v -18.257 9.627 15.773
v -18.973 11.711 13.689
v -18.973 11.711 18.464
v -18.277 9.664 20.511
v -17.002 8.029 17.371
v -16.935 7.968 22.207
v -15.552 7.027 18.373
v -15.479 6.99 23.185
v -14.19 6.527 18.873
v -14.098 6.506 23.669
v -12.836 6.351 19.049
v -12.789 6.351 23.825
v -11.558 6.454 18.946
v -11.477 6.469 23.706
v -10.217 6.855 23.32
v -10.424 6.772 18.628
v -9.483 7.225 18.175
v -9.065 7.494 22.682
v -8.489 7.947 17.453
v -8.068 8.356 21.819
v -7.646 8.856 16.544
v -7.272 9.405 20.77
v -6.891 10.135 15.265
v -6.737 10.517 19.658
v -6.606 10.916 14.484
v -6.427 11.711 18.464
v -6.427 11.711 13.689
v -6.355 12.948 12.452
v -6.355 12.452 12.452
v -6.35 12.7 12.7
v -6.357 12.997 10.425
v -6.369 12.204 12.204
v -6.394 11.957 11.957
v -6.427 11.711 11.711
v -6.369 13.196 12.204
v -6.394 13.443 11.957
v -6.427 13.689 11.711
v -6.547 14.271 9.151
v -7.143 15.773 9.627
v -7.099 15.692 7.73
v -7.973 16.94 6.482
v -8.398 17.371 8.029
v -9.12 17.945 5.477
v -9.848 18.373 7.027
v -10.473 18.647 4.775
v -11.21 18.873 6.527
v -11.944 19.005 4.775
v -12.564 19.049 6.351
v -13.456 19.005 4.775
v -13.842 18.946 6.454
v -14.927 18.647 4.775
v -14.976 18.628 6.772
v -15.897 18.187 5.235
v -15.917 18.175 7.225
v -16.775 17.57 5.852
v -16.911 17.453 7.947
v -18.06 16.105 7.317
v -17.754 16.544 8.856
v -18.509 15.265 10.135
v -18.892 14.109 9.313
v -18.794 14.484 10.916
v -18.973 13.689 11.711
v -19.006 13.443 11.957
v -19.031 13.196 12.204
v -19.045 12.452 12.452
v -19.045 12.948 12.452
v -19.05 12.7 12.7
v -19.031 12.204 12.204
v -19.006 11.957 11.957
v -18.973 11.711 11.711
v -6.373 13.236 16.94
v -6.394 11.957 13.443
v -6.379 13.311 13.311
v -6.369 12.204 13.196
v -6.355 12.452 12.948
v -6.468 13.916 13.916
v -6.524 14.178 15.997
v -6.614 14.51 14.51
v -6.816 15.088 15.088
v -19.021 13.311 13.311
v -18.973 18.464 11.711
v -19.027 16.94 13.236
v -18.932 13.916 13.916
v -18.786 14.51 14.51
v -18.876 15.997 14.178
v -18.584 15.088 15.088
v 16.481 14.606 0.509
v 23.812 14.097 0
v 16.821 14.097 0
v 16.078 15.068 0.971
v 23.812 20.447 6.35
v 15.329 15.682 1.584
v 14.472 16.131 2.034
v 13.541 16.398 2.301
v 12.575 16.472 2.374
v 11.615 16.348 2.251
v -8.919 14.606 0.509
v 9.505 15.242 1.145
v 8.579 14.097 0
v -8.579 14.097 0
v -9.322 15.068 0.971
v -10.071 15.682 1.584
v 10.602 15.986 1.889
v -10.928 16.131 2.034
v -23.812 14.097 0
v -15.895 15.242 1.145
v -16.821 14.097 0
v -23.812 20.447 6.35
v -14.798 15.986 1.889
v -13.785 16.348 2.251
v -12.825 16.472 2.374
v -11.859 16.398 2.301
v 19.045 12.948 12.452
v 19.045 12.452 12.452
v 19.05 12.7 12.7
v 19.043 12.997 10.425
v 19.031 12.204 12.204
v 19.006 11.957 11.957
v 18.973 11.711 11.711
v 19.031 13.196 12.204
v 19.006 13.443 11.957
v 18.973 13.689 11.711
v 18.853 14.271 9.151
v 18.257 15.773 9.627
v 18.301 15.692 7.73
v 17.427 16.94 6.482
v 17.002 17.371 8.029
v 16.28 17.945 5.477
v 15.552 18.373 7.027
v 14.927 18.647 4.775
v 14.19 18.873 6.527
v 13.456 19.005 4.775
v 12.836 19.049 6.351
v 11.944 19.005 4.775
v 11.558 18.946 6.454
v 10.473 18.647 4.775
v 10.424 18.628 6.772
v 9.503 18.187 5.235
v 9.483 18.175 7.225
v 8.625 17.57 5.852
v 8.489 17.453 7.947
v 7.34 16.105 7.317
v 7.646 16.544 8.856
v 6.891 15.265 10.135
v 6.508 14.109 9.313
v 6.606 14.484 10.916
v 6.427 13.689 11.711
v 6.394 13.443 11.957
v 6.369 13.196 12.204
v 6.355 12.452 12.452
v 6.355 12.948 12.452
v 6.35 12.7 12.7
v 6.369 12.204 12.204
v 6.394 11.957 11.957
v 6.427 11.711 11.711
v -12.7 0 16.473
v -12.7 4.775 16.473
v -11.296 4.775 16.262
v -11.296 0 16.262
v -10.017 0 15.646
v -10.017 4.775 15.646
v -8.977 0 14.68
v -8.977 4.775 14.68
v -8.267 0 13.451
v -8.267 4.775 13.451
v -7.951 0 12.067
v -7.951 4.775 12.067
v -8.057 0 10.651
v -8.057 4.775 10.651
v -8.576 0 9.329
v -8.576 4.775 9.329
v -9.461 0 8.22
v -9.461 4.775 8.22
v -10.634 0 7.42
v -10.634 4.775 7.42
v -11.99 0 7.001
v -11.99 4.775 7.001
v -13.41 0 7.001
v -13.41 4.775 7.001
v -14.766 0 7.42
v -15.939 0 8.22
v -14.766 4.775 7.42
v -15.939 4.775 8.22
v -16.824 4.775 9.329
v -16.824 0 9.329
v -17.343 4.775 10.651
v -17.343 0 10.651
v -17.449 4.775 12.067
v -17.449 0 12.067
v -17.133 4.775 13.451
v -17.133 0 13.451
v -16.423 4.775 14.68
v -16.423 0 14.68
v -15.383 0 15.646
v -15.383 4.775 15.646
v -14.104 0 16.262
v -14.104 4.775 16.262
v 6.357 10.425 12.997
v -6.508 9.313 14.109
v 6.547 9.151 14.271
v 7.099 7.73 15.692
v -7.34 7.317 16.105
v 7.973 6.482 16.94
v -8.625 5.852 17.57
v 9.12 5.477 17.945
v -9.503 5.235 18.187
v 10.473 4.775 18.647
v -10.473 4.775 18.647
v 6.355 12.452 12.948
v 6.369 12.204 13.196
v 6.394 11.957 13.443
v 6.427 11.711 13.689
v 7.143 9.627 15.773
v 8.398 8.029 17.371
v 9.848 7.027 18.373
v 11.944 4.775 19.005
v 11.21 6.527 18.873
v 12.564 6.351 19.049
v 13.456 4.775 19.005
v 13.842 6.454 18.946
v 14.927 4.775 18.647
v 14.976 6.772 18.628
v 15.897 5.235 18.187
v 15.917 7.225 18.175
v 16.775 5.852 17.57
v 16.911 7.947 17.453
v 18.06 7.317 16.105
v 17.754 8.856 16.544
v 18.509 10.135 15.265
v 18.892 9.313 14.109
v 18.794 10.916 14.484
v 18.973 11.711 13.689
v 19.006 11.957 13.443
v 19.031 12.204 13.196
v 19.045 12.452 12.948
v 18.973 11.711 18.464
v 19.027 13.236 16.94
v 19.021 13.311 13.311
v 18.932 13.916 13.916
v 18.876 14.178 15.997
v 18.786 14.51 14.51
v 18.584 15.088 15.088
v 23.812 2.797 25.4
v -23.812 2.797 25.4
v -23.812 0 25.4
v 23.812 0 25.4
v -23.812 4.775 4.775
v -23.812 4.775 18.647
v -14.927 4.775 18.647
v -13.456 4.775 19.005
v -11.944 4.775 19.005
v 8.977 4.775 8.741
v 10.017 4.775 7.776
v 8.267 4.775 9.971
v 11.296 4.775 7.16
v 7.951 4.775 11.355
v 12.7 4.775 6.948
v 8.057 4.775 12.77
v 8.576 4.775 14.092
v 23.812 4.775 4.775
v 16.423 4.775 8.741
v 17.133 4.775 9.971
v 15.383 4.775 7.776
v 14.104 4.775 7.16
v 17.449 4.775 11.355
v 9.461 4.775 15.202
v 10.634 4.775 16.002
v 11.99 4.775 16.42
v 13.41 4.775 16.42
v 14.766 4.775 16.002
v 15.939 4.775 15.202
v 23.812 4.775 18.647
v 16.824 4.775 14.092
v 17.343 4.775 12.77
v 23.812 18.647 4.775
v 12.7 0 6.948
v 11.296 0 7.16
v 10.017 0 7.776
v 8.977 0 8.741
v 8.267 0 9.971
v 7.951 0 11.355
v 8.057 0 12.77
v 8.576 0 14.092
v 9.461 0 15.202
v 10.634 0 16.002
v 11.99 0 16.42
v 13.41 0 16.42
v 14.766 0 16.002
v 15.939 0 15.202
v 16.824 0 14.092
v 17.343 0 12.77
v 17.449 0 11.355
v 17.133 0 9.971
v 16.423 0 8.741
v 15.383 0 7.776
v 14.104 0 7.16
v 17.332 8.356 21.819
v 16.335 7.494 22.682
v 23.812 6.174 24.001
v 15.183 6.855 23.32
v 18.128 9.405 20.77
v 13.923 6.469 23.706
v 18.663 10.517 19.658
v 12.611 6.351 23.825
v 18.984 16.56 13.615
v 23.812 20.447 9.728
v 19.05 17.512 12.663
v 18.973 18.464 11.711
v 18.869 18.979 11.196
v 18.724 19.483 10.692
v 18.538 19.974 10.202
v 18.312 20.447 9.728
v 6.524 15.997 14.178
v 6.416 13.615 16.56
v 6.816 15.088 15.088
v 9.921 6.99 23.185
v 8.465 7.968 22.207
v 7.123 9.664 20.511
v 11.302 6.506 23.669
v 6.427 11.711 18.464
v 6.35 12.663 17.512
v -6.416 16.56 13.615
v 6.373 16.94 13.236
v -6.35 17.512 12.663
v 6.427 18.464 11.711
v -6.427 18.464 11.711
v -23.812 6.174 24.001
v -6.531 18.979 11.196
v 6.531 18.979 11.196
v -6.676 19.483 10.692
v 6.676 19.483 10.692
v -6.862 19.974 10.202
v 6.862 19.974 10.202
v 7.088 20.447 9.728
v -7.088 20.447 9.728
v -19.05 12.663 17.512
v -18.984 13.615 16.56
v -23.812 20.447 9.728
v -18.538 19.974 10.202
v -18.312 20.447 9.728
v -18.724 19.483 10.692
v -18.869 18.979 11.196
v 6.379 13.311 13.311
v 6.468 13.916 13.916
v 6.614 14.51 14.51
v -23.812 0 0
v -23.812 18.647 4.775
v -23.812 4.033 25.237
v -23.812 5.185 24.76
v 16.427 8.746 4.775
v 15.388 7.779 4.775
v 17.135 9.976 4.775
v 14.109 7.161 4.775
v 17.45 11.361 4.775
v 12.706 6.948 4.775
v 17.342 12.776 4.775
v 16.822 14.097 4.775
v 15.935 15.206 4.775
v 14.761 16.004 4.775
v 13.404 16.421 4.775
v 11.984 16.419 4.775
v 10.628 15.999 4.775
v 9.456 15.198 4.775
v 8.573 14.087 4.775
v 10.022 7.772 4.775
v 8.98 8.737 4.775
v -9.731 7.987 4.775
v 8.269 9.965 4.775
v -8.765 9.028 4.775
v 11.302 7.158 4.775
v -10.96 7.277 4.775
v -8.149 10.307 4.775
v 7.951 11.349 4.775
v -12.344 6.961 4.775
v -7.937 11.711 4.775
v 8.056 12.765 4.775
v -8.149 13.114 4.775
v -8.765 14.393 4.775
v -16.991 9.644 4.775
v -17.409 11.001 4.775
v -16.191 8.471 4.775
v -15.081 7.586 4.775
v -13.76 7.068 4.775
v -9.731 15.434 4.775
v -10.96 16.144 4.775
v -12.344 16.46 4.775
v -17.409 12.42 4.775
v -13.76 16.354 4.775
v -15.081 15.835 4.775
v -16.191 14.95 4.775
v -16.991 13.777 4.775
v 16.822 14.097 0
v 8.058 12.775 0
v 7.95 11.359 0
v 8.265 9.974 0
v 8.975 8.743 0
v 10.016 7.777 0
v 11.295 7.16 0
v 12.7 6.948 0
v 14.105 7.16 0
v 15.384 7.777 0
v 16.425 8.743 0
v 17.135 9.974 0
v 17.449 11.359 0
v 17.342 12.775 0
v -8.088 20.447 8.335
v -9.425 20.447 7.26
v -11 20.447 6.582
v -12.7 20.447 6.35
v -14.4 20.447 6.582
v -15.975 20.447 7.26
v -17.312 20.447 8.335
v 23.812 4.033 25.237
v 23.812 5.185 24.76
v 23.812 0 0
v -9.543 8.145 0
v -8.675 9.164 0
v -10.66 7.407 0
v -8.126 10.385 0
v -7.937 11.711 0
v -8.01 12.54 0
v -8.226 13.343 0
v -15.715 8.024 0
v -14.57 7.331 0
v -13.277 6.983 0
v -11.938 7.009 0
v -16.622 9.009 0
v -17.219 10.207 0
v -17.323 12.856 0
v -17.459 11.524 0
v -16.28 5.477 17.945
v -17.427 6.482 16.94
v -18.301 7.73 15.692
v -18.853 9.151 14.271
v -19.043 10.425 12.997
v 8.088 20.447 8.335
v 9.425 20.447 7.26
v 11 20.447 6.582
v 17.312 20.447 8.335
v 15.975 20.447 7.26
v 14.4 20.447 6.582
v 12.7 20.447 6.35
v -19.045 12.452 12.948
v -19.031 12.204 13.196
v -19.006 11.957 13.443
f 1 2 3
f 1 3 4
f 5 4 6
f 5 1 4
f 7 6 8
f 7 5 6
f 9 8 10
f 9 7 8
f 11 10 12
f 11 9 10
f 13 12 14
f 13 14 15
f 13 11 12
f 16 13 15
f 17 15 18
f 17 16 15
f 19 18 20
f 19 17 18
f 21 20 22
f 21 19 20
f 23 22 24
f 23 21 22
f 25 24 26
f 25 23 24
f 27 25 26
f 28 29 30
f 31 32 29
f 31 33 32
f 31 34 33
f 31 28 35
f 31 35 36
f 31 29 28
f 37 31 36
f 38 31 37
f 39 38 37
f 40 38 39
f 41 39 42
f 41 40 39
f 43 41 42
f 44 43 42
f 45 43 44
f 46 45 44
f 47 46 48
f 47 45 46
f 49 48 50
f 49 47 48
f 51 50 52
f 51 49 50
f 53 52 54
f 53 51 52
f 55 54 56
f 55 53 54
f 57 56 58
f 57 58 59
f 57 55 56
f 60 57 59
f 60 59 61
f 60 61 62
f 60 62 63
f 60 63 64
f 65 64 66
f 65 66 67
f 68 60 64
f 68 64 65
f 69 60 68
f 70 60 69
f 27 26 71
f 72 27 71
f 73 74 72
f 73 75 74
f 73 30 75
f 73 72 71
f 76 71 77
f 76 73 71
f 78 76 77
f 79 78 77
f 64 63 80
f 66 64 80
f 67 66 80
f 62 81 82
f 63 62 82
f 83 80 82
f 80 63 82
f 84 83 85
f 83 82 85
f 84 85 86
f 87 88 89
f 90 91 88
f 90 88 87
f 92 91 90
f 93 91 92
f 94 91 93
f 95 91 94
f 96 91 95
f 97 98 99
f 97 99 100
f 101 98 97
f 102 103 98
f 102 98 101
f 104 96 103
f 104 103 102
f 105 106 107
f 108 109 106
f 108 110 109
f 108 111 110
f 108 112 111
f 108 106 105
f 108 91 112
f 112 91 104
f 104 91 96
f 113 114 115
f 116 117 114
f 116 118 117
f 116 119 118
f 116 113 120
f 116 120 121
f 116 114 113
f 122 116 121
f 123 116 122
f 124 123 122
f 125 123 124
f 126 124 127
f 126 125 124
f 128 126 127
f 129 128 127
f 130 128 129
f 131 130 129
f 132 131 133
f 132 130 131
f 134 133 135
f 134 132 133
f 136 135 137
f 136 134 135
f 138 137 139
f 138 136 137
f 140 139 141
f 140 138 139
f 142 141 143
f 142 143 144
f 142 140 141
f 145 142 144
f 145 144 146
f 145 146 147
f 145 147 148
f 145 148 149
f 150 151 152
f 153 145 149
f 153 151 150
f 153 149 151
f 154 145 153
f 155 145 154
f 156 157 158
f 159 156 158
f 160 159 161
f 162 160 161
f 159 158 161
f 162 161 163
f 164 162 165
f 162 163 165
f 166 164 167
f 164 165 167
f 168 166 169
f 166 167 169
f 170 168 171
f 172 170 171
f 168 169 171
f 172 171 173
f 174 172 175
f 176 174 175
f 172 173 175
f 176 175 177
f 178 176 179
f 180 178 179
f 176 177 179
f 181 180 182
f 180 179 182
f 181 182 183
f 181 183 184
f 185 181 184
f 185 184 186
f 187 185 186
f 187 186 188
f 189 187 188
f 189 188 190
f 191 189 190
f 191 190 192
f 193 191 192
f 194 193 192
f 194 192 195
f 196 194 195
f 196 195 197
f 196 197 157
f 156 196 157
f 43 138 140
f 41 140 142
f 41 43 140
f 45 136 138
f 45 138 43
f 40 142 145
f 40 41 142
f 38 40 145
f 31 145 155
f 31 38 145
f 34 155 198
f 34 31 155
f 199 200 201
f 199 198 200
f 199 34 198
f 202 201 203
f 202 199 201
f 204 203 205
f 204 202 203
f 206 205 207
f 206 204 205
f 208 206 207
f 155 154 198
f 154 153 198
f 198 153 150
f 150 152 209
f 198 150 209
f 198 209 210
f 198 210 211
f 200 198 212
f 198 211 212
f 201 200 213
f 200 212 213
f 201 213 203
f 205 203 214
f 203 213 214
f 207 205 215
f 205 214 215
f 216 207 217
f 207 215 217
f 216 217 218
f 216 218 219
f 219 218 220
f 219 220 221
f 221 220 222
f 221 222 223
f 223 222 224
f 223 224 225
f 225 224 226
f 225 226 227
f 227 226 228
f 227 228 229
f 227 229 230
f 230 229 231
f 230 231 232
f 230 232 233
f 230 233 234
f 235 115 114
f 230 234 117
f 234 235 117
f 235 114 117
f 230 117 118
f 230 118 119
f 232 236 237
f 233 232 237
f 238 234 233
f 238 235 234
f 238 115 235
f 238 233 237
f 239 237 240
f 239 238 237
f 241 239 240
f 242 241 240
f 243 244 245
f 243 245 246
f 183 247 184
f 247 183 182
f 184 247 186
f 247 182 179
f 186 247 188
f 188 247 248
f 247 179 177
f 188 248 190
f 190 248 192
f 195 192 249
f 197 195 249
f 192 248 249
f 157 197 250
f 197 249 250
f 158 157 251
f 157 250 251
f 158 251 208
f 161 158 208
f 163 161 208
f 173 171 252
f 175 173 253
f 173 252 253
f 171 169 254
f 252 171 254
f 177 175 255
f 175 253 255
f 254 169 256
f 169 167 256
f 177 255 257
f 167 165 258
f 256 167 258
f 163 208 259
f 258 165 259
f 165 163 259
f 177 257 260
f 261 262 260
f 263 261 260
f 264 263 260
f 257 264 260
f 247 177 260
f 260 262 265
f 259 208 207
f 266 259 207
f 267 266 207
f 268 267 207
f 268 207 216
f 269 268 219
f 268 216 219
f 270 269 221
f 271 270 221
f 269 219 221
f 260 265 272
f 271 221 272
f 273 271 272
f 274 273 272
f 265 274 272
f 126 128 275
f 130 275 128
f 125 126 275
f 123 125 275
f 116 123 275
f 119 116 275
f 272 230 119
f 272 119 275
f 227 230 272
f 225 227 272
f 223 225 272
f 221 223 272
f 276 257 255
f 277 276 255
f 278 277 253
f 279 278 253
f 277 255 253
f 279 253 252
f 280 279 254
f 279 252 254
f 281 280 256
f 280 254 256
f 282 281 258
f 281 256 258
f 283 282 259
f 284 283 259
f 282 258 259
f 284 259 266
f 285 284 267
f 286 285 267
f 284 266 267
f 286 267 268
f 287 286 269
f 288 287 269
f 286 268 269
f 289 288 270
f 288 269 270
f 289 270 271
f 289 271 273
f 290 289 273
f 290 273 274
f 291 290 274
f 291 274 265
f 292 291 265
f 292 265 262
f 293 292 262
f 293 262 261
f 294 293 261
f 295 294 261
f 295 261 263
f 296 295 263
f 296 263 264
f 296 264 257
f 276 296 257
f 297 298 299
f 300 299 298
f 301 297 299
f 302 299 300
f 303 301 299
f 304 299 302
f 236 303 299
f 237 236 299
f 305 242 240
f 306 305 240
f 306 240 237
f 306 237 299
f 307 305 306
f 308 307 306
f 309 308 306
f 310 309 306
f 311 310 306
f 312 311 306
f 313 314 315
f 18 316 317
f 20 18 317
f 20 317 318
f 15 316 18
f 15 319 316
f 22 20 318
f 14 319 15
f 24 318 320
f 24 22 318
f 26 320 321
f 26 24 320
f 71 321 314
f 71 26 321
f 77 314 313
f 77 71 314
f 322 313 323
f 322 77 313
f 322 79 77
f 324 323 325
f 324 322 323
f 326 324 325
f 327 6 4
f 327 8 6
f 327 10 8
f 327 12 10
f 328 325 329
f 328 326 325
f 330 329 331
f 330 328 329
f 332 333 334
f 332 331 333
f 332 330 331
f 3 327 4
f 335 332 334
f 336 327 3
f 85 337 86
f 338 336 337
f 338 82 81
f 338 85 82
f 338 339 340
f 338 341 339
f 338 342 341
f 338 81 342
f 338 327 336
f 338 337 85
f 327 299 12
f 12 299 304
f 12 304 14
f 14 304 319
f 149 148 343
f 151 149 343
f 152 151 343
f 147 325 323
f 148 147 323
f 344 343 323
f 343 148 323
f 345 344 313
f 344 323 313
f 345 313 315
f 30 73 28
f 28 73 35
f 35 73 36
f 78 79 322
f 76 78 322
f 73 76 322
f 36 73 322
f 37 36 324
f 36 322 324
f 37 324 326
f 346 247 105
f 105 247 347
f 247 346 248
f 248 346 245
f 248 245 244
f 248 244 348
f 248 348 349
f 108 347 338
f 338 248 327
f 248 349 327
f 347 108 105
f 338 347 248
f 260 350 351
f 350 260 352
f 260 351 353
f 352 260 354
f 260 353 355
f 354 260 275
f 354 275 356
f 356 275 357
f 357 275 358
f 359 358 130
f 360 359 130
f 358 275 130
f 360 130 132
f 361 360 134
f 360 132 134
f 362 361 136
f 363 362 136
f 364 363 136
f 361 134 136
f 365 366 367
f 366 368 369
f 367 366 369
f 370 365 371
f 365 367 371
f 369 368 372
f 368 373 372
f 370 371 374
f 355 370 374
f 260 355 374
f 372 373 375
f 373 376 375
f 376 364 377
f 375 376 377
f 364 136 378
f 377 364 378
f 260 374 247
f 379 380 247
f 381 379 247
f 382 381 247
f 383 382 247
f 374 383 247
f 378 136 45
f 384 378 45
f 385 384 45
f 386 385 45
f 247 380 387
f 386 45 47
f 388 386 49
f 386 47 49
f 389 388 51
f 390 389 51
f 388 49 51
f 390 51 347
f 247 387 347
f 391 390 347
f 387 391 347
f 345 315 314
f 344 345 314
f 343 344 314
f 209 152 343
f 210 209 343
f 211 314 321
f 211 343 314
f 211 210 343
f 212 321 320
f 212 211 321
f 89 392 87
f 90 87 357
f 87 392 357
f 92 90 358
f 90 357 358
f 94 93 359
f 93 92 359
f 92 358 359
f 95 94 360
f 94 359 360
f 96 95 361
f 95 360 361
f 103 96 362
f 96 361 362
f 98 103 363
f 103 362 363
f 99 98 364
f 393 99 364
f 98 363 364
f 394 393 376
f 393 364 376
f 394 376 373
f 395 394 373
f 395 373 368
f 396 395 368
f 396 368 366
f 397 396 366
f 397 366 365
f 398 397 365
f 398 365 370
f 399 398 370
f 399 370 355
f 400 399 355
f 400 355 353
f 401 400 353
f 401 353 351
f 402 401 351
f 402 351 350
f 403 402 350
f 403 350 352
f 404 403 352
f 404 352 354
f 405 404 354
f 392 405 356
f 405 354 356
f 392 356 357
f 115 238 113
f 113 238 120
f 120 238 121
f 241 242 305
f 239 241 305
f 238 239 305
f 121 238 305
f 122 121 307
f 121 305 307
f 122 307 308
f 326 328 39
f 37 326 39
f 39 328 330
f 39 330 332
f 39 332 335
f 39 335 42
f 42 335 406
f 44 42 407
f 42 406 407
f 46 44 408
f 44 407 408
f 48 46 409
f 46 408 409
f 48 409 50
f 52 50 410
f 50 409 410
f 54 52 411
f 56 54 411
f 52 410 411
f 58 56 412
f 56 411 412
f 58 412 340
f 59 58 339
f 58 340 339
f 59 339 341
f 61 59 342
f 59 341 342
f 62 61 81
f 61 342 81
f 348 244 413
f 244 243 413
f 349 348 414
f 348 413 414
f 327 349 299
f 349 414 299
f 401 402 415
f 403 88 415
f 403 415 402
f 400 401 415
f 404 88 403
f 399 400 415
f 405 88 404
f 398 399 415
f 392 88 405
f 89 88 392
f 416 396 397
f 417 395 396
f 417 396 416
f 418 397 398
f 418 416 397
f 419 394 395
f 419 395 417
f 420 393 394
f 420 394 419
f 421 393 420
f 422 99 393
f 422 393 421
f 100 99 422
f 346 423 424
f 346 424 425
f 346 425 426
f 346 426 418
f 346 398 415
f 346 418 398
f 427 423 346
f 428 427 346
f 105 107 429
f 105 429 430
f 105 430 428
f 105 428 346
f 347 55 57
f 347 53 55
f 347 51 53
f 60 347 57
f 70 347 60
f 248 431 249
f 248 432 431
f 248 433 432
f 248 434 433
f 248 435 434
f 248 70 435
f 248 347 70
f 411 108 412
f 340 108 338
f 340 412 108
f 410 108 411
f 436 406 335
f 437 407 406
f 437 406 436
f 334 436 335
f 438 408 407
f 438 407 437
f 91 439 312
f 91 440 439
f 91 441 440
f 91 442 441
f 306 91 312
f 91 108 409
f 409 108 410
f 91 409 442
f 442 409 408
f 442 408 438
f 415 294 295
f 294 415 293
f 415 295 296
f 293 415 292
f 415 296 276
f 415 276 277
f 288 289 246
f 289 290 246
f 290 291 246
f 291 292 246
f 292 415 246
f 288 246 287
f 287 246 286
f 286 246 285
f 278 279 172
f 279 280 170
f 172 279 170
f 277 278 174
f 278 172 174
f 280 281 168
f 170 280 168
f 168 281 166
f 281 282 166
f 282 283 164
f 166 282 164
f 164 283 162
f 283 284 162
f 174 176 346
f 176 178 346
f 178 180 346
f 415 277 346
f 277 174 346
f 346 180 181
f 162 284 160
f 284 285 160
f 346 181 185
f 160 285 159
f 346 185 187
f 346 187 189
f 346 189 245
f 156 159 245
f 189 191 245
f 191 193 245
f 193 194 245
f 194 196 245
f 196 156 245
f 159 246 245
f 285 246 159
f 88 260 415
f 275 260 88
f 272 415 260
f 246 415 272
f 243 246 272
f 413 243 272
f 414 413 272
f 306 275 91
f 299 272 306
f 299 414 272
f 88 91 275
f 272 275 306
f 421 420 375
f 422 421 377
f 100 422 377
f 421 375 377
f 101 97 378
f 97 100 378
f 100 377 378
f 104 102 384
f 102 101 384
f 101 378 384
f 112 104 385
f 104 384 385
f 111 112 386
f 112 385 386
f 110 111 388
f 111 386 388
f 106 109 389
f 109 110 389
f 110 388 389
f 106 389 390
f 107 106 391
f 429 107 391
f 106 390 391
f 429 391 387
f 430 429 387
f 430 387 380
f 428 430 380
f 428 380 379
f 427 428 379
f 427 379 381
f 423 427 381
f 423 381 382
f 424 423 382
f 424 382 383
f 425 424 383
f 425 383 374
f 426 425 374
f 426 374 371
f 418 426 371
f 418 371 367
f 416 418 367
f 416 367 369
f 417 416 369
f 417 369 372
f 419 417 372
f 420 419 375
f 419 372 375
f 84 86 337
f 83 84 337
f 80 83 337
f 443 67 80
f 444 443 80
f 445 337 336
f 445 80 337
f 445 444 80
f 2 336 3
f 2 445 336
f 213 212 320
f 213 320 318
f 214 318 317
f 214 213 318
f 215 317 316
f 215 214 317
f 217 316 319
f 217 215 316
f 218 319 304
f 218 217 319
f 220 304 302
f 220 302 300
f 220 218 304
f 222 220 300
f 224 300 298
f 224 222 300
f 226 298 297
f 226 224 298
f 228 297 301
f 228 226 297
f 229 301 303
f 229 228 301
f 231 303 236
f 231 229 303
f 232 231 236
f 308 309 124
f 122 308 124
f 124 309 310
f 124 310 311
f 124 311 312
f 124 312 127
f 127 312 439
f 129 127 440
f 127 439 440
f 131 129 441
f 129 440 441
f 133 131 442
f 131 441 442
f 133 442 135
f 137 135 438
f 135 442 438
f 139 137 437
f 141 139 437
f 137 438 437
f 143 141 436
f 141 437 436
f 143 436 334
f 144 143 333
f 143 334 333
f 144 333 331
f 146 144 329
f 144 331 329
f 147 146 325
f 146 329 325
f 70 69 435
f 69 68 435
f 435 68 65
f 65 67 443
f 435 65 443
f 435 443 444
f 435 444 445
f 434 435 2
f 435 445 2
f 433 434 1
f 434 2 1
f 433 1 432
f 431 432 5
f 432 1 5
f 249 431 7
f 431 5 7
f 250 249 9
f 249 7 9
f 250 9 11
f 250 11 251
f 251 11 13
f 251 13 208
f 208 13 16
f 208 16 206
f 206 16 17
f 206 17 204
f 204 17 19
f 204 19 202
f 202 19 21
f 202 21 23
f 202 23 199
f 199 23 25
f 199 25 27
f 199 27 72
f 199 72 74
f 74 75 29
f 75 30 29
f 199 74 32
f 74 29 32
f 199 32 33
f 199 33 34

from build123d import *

# Parameters (mm, degrees)
BOSS_EXTRUDE1_START     = -20.6248
BOSS_EXTRUDE1_OUTLINE_W = 47.625
BOSS_EXTRUDE1_OUTLINE_H = 20.6248
BOSS_EXTRUDE1_DEPTH     = 25.4
BOSS_EXTRUDE1_2_DEPTH   = 4.7752
BOSS_EXTRUDE1_START_2   = 4.7752
BOSS_EXTRUDE1_3_DEPTH   = 20.6248
BOSS_EXTRUDE1_START_3   = -23.8125
BOSS_EXTRUDE1_4_DEPTH   = 47.625
SKETCH2_W               = 47.625
SKETCH2_H               = 25.4
BOSS_EXTRUDE2_DEPTH     = 4.7752
FILLET1_R               = 4.7752
CUT_EXTRUDE1_DEPTH      = 60.652834174
CHAMFER2_SIZE           = 6.35
SKETCH4_R               = 4.7625
CUT_EXTRUDE2_DEPTH      = 39.181153396
SKETCH5_R               = 4.7625
CUT_EXTRUDE3_DEPTH      = 38.556588562


with BuildPart() as part:
    # Boss-Extrude1: read off the stored shape, not the designer's step
    # Boss-Extrude1 outline → Boss-Extrude1 (new body)
    with BuildSketch(Plane.XZ.offset(-4.7752).offset(BOSS_EXTRUDE1_START)):
        with Locations((0, 15.0876)):
            Rectangle(BOSS_EXTRUDE1_OUTLINE_W, BOSS_EXTRUDE1_OUTLINE_H)
        with BuildLine():
            ThreePointArc((-18.972513521, 11.711023698), (-12.7, 19.05), (-6.427486479, 11.711023698))
            ThreePointArc((-6.427486479, 11.711023698), (-12.7, 6.35), (-18.972513521, 11.711023698))
        make_face(mode=Mode.SUBTRACT)
        with BuildLine():
            ThreePointArc((6.427486479, 11.711023698), (12.7, 19.05), (18.972513521, 11.711023698))
            ThreePointArc((18.972513521, 11.711023698), (12.7, 6.35), (6.427486479, 11.711023698))
        make_face(mode=Mode.SUBTRACT)
    extrude(amount=BOSS_EXTRUDE1_DEPTH)

    # Boss-Extrude1 2 outline → Boss-Extrude1 2 (add)
    with BuildSketch(Plane.XZ.offset(-4.7752)):
        with BuildLine():
            ThreePointArc((-18.972513521, 11.711023698), (-12.7, 6.35), (-6.427486479, 11.711023698))
            ThreePointArc((-6.427486479, 11.711023698), (-12.7, 19.05), (-18.972513521, 11.711023698))
        make_face()
        with BuildLine():
            ThreePointArc((6.427486479, 11.711023698), (12.7, 6.35), (18.972513521, 11.711023698))
            ThreePointArc((18.972513521, 11.711023698), (12.7, 19.05), (6.427486479, 11.711023698))
        make_face()
    extrude(amount=BOSS_EXTRUDE1_2_DEPTH)

    # Boss-Extrude1 3 outline → Boss-Extrude1 3 (cut)
    with BuildSketch(Plane.XY.offset(BOSS_EXTRUDE1_START_2)):
        with BuildLine():
            ThreePointArc((18.972513521, 11.711023698), (12.7, 19.05), (6.427486479, 11.711023698))
            ThreePointArc((6.427486479, 11.711023698), (12.7, 6.35), (18.972513521, 11.711023698))
        make_face()
        with BuildLine():
            ThreePointArc((-6.427486479, 11.711023698), (-12.7, 19.05), (-18.972513521, 11.711023698))
            ThreePointArc((-18.972513521, 11.711023698), (-12.7, 6.35), (-6.427486479, 11.711023698))
        make_face()
    extrude(amount=BOSS_EXTRUDE1_3_DEPTH, mode=Mode.SUBTRACT)

    # Boss-Extrude1 4 outline → Boss-Extrude1 4 (cut)
    with BuildSketch(Plane.YZ.offset(BOSS_EXTRUDE1_START_3)):
        Polygon((25.4, 25.4), (4.7752, 25.4), (25.4, 4.7752), align=None)
        Polygon((4.7752, 4.7752), (18.646847397, 4.7752), (4.7752, 18.646847397), align=None)
    extrude(amount=BOSS_EXTRUDE1_4_DEPTH, mode=Mode.SUBTRACT)

    # Sketch2 → Boss-Extrude2 (add)
    with BuildSketch(Plane(origin=(0, 0, 4.7752), x_dir=(-1, 0, 0), z_dir=(0, 0, -1))):
        with Locations((0, 12.7)):
            Rectangle(SKETCH2_W, SKETCH2_H)
    extrude(amount=BOSS_EXTRUDE2_DEPTH)

    # Fillet1
    fillet1_edges = [part.edges().sort_by_distance(p)[0] for p in [
        (0, 25.4, 4.7752),
        (0, 4.7752, 25.4),
    ]]
    fillet(fillet1_edges, radius=FILLET1_R)

    # Sketch3 → Cut-Extrude1 (cut, through all)
    with BuildSketch(Plane(origin=(23.8125, 0, 0), x_dir=(0, 0, -1), z_dir=(1, 0, 0))):
        Polygon((0, 20.447), (-11.476191114, 20.447), (-2.66042984, 31.108635465), (0, 31.108635465), align=None)
    extrude(amount=-CUT_EXTRUDE1_DEPTH, mode=Mode.SUBTRACT)

    # Chamfer2
    chamfer2_edges = [part.edges().sort_by_distance(p)[0] for p in [
        (0, 20.447, 0),
    ]]
    chamfer(chamfer2_edges, length=CHAMFER2_SIZE - 0.0001)  # a hair under: the kernel refuses the full size

    # Sketch4 → Cut-Extrude2 (cut, through all)
    with BuildSketch(Plane(origin=(0, 4.7752, 0), x_dir=(1, 0, 0), z_dir=(0, 1, 0))):
        with Locations(Location((-12.7, -11.71067, 0), (0, 0, 270))):
            Circle(SKETCH4_R)
        with Locations(Location((12.7, -11.71067, 0), (0, 0, 90))):
            Circle(SKETCH4_R)
    extrude(amount=-CUT_EXTRUDE2_DEPTH, mode=Mode.SUBTRACT)

    # Sketch5 → Cut-Extrude3 (cut, through all)
    with BuildSketch(Plane.XY.offset(4.7752)):
        with Locations((-12.7, 11.71067)):
            Circle(SKETCH5_R)
        with Locations(Location((12.7, 11.71067, 0), (0, 0, 30.070595226))):
            Circle(SKETCH5_R)
    extrude(amount=-CUT_EXTRUDE3_DEPTH, mode=Mode.SUBTRACT)


solid = part.part
